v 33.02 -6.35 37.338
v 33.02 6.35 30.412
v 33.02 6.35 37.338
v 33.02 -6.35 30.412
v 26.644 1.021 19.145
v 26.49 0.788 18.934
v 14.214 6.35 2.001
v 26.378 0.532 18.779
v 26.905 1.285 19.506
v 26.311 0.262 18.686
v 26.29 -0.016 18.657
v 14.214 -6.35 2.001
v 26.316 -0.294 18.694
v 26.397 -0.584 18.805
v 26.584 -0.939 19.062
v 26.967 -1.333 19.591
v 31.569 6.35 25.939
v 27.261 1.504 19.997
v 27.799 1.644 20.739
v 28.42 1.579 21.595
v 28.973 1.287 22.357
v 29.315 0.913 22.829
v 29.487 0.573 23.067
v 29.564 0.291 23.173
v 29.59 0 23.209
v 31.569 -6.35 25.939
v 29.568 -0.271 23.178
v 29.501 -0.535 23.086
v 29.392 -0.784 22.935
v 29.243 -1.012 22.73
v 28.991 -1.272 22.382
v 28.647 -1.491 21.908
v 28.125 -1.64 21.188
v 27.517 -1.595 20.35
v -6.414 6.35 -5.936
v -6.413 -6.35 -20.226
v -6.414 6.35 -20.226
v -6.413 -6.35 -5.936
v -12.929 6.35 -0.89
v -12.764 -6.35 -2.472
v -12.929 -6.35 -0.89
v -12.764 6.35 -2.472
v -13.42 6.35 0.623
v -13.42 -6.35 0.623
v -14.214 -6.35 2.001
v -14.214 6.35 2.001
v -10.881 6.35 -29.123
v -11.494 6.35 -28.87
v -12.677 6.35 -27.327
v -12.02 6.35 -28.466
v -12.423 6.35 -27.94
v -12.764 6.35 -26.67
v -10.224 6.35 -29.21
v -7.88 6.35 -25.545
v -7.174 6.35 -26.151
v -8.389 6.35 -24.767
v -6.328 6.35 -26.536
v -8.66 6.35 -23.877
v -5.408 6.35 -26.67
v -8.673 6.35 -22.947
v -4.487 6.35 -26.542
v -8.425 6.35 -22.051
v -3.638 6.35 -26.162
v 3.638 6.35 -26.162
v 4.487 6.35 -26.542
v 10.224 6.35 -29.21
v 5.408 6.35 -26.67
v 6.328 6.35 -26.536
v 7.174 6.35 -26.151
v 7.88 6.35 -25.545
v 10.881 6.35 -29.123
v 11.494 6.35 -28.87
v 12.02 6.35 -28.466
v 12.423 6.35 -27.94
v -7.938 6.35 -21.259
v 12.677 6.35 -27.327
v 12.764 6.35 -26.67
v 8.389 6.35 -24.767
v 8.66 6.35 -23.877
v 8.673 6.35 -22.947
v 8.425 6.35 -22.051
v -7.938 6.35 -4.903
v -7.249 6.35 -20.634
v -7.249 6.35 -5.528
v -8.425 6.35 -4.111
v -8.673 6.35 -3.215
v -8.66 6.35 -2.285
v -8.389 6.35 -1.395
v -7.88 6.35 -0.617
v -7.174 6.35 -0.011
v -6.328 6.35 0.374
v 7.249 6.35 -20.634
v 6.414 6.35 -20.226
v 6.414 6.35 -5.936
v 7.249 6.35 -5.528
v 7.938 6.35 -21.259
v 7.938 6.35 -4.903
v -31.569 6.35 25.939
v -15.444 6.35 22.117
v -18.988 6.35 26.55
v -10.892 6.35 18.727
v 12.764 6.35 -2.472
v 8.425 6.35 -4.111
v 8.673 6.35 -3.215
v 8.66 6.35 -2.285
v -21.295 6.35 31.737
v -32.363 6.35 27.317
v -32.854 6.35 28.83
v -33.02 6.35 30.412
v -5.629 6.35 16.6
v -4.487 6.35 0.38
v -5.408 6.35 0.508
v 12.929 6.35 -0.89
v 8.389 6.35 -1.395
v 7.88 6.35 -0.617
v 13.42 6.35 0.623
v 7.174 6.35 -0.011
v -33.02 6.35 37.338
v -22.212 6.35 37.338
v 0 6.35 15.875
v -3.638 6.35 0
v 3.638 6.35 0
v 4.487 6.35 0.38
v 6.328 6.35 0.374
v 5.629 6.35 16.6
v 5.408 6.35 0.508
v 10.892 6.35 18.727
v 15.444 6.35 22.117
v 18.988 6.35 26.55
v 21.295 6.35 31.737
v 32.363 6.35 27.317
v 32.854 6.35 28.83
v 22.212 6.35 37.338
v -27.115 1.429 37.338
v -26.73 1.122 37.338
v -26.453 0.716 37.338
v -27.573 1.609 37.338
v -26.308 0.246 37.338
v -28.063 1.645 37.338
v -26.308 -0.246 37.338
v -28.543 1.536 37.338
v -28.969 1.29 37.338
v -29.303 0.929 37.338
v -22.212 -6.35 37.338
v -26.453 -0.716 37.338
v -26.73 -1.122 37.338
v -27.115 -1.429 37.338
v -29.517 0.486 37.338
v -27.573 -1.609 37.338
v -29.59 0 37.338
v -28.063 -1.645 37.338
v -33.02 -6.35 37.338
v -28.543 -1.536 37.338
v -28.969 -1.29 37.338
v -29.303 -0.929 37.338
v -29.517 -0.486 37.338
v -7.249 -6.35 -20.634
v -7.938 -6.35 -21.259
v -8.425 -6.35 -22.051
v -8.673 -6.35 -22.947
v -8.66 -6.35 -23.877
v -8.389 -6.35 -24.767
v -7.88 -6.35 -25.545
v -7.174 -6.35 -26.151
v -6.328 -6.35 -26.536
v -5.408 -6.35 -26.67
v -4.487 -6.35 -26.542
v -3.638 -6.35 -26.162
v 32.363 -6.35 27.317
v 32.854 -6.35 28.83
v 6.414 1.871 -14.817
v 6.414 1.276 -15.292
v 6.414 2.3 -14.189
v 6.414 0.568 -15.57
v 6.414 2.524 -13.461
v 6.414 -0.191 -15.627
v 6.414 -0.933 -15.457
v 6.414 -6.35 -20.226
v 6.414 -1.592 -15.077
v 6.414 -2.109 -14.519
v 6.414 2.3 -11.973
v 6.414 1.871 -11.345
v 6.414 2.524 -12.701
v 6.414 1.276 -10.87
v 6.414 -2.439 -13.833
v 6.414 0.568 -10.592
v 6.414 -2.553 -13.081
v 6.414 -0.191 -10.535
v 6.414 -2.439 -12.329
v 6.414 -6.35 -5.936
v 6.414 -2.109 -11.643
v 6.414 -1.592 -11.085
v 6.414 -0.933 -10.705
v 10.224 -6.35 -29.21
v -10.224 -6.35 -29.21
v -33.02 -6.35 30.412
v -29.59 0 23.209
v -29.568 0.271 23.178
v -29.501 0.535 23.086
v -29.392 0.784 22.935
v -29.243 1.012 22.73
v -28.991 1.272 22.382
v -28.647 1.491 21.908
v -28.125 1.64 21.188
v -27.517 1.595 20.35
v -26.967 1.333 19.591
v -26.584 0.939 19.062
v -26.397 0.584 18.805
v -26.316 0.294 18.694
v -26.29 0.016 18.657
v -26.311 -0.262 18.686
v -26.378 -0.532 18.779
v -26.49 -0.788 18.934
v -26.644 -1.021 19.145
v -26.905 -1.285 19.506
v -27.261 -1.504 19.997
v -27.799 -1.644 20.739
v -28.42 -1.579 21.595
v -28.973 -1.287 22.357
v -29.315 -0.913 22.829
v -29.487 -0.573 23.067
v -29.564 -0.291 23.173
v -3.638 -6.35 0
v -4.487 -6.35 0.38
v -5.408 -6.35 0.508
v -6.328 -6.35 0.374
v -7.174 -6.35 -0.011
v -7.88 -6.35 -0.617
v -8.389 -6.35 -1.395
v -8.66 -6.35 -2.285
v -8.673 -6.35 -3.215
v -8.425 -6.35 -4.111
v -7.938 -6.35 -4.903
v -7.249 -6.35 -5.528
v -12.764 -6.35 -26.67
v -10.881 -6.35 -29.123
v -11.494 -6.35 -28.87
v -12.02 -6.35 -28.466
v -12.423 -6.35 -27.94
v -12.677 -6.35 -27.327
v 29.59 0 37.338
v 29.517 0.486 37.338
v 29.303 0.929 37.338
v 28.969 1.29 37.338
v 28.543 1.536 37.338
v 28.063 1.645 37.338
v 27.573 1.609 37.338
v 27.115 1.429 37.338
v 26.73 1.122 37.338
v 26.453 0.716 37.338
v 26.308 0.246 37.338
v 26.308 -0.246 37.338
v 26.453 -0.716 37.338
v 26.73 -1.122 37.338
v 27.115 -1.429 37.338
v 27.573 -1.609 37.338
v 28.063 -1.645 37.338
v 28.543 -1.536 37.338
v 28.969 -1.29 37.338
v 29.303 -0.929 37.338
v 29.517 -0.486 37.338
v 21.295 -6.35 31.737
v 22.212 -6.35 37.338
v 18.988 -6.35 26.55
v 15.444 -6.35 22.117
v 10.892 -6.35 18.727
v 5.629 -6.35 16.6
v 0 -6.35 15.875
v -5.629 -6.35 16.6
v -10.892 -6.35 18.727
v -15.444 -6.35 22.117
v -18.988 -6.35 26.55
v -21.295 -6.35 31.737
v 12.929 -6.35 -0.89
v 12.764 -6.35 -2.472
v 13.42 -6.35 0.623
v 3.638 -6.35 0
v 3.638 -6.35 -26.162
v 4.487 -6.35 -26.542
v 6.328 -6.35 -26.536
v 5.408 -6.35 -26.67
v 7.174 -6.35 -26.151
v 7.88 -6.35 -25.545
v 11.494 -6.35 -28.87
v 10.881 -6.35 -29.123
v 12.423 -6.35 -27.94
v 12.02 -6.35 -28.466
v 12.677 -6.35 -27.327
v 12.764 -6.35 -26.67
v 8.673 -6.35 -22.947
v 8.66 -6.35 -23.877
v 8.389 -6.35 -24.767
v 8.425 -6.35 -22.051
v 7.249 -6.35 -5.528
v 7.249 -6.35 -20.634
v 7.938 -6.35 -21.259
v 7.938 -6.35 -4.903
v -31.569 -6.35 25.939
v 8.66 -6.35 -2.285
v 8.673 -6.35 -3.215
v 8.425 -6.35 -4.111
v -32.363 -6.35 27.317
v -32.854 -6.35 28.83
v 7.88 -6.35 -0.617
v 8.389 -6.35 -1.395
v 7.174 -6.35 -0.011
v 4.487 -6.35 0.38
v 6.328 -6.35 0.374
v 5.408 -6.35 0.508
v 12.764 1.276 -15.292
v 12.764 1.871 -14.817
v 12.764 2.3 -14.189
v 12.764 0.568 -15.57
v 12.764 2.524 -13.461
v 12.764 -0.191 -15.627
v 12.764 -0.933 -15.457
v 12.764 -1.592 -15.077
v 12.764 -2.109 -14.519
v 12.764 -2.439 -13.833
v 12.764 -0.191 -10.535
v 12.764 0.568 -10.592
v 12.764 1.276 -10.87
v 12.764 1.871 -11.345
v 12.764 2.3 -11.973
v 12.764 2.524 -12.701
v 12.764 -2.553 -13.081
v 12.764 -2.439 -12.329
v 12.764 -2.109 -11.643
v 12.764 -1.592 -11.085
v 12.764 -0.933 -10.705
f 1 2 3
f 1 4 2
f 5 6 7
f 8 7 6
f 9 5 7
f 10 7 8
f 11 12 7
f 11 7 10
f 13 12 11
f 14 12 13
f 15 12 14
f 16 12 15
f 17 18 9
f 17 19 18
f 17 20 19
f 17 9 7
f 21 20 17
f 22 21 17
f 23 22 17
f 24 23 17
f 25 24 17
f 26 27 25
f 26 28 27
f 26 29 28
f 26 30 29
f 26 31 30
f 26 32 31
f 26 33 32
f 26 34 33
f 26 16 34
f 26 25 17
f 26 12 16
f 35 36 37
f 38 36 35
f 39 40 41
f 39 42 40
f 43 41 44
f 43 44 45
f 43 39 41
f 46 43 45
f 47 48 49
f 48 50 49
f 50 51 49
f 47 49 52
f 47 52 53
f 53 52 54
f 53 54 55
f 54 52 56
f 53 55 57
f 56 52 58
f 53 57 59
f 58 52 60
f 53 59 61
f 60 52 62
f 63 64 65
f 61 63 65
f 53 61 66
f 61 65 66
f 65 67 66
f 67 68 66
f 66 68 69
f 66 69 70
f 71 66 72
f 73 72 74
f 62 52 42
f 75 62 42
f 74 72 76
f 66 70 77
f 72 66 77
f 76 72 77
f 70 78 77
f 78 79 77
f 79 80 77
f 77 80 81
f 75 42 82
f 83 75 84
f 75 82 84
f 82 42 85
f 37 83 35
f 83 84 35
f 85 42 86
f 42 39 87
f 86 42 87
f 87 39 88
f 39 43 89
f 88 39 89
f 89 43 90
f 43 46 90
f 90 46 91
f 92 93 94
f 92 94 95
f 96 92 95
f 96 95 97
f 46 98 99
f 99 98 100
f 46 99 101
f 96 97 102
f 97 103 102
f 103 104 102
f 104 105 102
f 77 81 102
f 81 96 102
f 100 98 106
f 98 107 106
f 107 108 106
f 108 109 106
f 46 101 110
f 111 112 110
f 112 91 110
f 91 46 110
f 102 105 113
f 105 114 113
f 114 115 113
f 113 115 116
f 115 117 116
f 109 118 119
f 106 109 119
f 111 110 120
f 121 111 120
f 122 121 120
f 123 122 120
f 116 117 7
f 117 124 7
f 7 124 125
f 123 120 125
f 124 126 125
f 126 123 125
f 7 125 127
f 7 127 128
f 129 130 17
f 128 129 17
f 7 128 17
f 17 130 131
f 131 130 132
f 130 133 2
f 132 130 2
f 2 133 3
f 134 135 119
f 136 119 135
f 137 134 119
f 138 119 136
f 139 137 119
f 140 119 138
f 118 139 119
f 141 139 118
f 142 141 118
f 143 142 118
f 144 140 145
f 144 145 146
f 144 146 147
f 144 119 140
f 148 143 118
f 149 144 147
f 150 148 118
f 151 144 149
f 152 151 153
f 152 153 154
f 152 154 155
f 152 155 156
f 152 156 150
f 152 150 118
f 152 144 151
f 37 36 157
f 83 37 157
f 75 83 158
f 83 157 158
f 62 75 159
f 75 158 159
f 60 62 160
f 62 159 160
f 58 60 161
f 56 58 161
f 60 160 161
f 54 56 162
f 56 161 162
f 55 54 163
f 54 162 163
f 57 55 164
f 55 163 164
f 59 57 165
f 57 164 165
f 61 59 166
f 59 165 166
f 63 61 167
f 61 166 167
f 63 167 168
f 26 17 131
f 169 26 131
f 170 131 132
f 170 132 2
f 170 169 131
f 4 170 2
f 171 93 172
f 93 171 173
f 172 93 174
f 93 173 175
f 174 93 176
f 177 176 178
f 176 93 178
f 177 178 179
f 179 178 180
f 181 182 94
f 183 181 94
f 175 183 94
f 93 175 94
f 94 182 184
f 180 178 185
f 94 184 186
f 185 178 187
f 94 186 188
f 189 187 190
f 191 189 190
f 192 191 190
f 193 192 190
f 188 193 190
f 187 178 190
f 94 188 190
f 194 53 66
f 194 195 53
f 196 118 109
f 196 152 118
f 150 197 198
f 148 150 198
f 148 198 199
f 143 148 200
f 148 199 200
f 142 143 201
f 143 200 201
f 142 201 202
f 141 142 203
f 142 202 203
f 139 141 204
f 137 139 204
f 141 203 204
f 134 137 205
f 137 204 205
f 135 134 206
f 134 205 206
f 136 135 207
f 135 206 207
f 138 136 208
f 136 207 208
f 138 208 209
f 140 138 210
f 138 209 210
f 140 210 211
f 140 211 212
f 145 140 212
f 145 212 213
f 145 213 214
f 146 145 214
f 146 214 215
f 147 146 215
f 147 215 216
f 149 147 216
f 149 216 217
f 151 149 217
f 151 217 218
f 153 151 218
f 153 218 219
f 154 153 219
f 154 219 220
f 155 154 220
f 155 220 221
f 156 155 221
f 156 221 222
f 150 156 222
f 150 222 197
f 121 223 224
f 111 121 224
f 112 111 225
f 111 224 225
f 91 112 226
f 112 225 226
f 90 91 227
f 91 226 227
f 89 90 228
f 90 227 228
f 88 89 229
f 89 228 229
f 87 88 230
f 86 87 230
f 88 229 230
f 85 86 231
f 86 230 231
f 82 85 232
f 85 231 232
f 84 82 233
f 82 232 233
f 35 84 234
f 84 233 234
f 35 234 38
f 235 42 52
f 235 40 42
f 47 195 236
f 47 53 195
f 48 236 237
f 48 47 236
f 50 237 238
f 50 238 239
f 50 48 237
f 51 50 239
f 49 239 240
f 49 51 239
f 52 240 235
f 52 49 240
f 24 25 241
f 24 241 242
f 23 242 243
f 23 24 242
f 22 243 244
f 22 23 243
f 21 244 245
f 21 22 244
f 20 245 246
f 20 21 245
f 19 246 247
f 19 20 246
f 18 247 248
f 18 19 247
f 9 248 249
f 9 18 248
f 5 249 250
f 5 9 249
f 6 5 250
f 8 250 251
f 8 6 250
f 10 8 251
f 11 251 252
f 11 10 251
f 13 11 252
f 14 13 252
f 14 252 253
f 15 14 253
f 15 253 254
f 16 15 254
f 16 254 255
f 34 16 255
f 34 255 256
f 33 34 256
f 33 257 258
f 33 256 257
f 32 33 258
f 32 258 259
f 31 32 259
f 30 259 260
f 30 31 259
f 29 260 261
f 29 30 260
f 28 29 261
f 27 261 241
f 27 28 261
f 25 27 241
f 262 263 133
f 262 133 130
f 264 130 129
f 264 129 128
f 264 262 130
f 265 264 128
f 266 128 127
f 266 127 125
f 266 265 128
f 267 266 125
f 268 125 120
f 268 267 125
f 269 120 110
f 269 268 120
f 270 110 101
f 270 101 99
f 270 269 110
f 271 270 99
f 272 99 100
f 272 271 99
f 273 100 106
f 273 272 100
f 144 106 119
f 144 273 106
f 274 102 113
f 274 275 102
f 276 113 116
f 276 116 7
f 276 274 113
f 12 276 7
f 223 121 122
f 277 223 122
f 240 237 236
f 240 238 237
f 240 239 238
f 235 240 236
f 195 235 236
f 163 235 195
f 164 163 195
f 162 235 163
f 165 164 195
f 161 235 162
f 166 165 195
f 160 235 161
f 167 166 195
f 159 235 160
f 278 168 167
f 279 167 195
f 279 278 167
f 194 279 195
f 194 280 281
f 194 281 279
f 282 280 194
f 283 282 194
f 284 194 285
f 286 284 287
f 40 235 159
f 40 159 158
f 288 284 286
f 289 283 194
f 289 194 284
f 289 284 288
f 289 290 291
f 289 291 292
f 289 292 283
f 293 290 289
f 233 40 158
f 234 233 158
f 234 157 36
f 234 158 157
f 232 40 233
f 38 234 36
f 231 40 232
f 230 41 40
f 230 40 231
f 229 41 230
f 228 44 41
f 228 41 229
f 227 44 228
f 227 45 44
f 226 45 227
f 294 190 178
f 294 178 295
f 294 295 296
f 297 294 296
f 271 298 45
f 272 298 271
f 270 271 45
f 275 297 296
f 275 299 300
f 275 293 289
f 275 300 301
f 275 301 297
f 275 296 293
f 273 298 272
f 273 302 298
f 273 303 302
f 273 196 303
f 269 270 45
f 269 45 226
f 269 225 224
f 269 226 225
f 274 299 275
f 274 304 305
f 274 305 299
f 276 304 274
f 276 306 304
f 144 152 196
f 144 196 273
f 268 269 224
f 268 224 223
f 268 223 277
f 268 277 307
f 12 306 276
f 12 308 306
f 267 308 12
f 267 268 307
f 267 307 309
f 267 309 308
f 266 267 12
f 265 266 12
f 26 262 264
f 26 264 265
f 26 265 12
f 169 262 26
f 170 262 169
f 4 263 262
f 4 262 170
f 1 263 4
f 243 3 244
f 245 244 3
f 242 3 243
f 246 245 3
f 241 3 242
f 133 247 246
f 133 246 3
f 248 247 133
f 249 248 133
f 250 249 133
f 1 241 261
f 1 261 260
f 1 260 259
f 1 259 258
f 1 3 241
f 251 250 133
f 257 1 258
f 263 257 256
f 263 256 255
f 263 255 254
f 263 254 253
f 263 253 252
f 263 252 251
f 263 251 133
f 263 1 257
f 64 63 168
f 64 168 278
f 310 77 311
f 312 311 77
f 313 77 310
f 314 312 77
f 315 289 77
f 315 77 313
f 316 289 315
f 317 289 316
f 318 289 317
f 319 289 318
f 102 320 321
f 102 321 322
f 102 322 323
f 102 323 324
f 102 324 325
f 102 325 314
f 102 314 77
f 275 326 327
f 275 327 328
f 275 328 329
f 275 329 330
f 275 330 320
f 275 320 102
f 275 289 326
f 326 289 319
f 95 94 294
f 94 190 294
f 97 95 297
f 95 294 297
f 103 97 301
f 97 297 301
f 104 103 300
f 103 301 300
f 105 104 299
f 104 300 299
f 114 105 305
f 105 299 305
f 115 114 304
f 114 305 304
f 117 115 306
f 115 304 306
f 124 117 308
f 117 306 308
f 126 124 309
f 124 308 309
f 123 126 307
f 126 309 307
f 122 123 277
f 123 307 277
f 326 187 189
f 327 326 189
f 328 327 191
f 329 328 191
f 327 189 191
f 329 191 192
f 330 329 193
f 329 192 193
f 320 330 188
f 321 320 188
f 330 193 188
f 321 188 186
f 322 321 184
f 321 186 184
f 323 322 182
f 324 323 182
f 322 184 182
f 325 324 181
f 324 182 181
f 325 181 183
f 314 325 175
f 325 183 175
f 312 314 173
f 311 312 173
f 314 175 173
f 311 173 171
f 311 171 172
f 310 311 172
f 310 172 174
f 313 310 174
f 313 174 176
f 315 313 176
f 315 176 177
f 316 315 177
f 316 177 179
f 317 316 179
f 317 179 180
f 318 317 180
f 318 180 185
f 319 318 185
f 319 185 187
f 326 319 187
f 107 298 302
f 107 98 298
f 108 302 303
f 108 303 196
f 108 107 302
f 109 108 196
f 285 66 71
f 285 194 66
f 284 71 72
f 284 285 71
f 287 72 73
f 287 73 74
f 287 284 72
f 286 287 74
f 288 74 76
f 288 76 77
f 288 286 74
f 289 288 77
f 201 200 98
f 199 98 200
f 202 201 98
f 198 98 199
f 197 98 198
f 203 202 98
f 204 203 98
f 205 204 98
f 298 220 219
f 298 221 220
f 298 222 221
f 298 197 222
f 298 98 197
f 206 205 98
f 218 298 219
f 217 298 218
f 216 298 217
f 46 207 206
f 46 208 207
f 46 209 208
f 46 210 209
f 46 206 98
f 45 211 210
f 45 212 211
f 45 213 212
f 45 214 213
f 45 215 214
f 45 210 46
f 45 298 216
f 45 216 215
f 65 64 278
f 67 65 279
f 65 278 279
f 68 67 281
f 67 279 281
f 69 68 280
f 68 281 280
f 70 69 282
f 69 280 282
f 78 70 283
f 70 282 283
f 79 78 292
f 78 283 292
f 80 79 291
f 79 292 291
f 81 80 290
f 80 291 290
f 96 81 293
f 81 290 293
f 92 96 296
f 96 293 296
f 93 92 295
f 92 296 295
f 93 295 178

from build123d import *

# Parameters (mm, degrees)
F0_W     = 12.827
F0_H     = 26.162
F1_DEPTH = 6.35
F3_D     = 5.1054
F3_DEPTH = 26.6075
F5_D     = 3.3
F6_R     = 3.302
F7_DEPTH = 12.701
F8_R     = 2.54
F9_R     = 7.62
F10_R    = 7.62


# Not quite as in the source:
# - a pattern or mirror of a feature is missing from the dataset's text; its kind, count and spacing are read off the source's solid


with BuildPart() as f1:
    # F0 (on Front) → F1 (new body, symmetric)
    with BuildSketch(Plane.XZ):
        with BuildLine():
            Line((-12.7635, -29.21), (12.7635, -29.21))
            Line((12.7635, -29.21), (12.7635, 0))
            Line((12.7635, 0), (33.02, 27.94))
            Line((33.02, 27.94), (33.02, 37.338))
            Line((33.02, 37.338), (22.2119333017, 37.338))
            ThreePointArc((22.2119333017, 37.338), (0, 15.875), (-22.2119333017, 37.338))
            Line((-22.2119333017, 37.338), (-33.02, 37.338))
            Line((-33.02, 37.338), (-33.02, 27.94))
            Line((-33.02, 27.94), (-12.7635, 0))
            Line((-12.7635, 0), (-12.7635, -29.21))
        make_face()
        with Locations((0, -13.081)):
            Rectangle(F0_W, F0_H, mode=Mode.SUBTRACT)
    extrude(amount=F1_DEPTH, both=True)

    # F3 (through all, one way)
    with BuildSketch(Plane(origin=(6.4135, 0, 0), x_dir=(0, -1, 0), z_dir=(-1, 0, 0))):
        with Locations((0, -13.081)):
            Circle(F3_D / 2)
    extrude(amount=-F3_DEPTH, mode=Mode.SUBTRACT)

    # F5 (through all)
    with Locations(Plane.XY.offset(37.338)):
        with Locations((-27.94, 0)):
            f5 = Hole(F5_D / 2)

    # F5_copies: F5 across plane
    add(f5.mirror(Plane(origin=(6e-06, 0, 0), x_dir=(0, 0, 1), z_dir=(1, 0, 0))), mode=Mode.SUBTRACT)

    # F6 (on face) → F7 (cut, through all)
    with BuildSketch(Plane.XZ.offset(6.35)):
        with Locations((-5.3975, -2.794)):
            Circle(F6_R)
        with Locations((-5.3975, -23.368)):
            Circle(F6_R)
        with Locations((5.3975, -2.794)):
            Circle(F6_R)
        with Locations((5.3975, -23.368)):
            Circle(F6_R)
    extrude(amount=-F7_DEPTH, mode=Mode.SUBTRACT)

    # F8
    f8_edges = [f1.edges().sort_by_distance(p)[0] for p in [
        (12.7635, 0, -29.21),
        (-12.7635, 0, -29.21),
    ]]
    fillet(f8_edges, radius=F8_R)

    # F9
    f9_edges = [f1.edges().sort_by_distance(p)[0] for p in [
        (12.7635, 0, 0),
        (-12.7635, 0, 0),
    ]]
    fillet(f9_edges, radius=F9_R)

    # F10
    f10_edges = [f1.edges().sort_by_distance(p)[0] for p in [
        (33.02, 0, 27.94),
        (-33.02, 0, 27.94),
    ]]
    fillet(f10_edges, radius=F10_R)


solid = f1.part
